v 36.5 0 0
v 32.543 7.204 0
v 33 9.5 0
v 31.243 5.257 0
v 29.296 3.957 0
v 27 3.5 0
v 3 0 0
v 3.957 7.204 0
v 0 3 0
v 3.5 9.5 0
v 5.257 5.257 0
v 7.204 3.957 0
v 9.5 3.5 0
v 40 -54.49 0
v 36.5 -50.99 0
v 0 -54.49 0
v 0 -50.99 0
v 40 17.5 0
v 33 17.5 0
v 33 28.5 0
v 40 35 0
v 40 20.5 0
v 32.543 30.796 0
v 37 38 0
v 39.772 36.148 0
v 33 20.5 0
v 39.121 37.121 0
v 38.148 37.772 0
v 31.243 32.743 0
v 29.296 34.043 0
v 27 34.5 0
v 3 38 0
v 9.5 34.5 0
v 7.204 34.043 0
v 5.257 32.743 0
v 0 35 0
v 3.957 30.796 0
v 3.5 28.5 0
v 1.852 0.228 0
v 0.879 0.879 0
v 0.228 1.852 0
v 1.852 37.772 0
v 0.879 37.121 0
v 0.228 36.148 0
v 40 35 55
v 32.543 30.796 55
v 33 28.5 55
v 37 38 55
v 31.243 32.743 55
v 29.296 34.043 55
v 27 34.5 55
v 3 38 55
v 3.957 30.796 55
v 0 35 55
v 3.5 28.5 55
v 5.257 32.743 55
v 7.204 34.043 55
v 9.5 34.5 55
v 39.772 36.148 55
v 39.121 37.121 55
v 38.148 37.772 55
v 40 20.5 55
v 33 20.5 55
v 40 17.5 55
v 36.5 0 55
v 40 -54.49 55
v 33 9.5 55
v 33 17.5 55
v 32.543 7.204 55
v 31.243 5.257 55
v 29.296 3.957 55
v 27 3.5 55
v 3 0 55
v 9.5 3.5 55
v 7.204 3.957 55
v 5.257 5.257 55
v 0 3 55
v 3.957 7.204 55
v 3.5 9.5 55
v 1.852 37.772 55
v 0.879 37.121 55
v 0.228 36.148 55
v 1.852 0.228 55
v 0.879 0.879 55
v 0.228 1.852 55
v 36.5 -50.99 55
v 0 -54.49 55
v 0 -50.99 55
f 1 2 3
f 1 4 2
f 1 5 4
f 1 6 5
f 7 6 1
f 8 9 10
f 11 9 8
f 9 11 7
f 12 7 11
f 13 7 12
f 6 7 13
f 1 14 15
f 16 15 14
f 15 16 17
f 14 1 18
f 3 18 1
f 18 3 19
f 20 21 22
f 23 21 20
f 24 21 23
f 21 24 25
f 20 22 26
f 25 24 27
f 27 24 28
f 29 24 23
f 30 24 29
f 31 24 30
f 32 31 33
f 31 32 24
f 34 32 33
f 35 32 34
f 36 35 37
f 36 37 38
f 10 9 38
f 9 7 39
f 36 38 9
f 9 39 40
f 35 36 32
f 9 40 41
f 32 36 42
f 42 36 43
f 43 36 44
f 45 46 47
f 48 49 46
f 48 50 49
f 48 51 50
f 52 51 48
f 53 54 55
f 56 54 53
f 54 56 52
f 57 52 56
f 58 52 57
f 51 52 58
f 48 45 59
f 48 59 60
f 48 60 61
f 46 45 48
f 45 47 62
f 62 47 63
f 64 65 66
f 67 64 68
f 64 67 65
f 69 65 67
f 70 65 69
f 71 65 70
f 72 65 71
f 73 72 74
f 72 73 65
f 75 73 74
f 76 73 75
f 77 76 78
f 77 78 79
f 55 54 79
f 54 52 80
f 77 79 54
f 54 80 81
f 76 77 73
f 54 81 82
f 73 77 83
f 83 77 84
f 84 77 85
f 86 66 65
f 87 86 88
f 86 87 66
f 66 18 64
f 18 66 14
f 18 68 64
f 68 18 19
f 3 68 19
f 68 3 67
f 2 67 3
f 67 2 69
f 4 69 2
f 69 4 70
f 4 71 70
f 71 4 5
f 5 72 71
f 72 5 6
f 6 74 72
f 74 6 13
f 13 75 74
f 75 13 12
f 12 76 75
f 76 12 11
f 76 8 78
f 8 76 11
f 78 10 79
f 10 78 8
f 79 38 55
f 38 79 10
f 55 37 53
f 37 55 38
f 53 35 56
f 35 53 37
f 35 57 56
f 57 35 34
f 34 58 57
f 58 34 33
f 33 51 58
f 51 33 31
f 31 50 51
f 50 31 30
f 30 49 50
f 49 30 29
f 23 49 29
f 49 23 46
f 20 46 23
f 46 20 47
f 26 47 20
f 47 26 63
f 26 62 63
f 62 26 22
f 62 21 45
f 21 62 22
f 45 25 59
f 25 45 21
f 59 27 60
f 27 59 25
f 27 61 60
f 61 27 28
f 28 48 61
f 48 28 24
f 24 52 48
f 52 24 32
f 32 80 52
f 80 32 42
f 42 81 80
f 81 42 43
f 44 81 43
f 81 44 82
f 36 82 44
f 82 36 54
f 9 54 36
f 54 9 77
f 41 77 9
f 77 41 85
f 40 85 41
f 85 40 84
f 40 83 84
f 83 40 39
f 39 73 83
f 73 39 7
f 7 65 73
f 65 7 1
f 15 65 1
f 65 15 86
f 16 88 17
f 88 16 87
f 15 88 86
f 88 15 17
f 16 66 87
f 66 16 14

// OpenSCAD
// file: roundedsquare.scad
module roundedSquare(size=[10,10], radius=1, center=false, $fn=16) {
    size1 = (size+0==size) ? [size,size] : size;
    if (radius <= 0) {
        square(size1, center=center);
    }
    else {
        translate(center ? -size1/2 : [0,0])
        hull() {
            translate([radius,radius]) circle(r=radius);
            translate([size1[0]-radius,radius]) circle(r=radius);
            translate([size1[0]-radius,size1[1]-radius]) circle(r=radius);
            translate([radius,size1[1]-radius]) circle(r=radius);
        }
    }
}

module roundedCube(size=[10,10,10], radius=1, center=false, $fn=16) {
    linear_extrude(height=size[2])
    roundedSquare(size=[size[0],size[1]], radius=radius, center=center);
}

module roundedOpenTopBox(size=[10,10,10], radius=2, wall=1, solid=false) {
    render(convexity=2)
    difference() {
        linear_extrude(height=size[2]) roundedSquare(size=[size[0],size[1]], radius=radius);
        if (!solid) {
            translate([0,0,wall])
            linear_extrude(height=size[2]-wall) 
            translate([wall,wall]) roundedSquare(size=[size[0]-2*wall,size[1]-2*wall], radius=radius-wall);
        }
    }
}
// main file
use <roundedsquare.scad>;

//<params>
distanceWallWartSticksOut=38;
powerbarHeight=36.5;
powerbarWidth=51;
wallWartWidth=55;
thickness=3.5;
innerCorner=6;
outerCorner=3;
cutOut=3;
thickness=3.5;
//</params>

module dummy(){}

w =distanceWallWartSticksOut;
h =powerbarHeight;
l =wallWartWidth;
extra=powerbarWidth;

module main() {
    linear_extrude(height=l)
    render(convexity=2)
    difference() {
        roundedSquare([h+thickness,w],radius=outerCorner);
        translate([thickness,thickness])
        roundedSquare([h-2*thickness,w-2*thickness],radius=innerCorner);
        translate([h-thickness-1,w/2-cutOut/2]) square([thickness+2+thickness,cutOut]);
    }
    translate([h,-extra])
    cube([thickness,extra+2*outerCorner,l]);
    translate([0,-extra-thickness+0.01])
    cube([h+thickness,thickness,l]);
}

main();
